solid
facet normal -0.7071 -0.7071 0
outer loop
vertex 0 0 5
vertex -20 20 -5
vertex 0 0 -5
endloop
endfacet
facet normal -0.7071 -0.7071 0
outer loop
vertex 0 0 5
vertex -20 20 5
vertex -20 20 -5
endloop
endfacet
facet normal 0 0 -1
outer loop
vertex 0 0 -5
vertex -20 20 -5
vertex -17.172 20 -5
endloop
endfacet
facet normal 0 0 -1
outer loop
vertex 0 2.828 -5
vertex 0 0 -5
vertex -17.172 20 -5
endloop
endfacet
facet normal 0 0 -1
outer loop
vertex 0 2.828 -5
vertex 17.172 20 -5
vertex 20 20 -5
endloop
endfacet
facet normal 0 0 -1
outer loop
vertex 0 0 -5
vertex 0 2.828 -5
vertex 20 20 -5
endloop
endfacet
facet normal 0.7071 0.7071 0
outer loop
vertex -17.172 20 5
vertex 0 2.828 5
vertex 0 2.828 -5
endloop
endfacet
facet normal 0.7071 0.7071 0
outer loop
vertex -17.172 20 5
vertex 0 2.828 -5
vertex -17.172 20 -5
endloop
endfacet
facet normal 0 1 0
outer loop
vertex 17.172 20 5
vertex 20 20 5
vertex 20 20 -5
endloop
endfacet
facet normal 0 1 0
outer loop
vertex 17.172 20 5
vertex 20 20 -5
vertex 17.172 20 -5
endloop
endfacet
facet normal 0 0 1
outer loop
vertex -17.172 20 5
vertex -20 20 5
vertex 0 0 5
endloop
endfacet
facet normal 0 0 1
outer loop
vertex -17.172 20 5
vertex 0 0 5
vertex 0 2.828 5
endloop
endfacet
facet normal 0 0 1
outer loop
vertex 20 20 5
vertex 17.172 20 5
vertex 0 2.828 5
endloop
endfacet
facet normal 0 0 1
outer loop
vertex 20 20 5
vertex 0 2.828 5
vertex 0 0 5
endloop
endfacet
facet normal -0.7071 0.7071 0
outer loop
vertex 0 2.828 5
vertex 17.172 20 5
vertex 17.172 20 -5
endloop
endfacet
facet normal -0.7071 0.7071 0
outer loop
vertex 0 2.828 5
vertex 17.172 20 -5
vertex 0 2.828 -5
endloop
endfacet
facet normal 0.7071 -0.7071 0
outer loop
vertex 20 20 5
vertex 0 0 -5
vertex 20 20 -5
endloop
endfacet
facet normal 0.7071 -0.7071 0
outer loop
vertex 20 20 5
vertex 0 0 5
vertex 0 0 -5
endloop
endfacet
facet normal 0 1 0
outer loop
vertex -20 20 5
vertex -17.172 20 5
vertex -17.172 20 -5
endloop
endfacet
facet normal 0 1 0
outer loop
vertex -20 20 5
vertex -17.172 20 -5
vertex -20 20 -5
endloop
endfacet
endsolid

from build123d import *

# Parameters (mm, degrees)
BOSS_EXTRUDE1_DEPTH = 5
CUT_EXTRUDE1_DEPTH  = 10


with BuildPart() as part:
    # Sketch1 → Boss-Extrude1 (new, symmetric)
    with BuildSketch(Plane.XY):
        Polygon((0, 0), (20, 20), (-20, 20), align=None)
    extrude(amount=BOSS_EXTRUDE1_DEPTH, both=True)

    # Sketch2 → Cut-Extrude1 (cut)
    with BuildSketch(Plane.XY.offset(5)):
        Polygon((0, 2.828427125), (-17.171572875, 20), (17.171572875, 20), align=None)
    extrude(amount=-CUT_EXTRUDE1_DEPTH, mode=Mode.SUBTRACT)


solid = part.part
